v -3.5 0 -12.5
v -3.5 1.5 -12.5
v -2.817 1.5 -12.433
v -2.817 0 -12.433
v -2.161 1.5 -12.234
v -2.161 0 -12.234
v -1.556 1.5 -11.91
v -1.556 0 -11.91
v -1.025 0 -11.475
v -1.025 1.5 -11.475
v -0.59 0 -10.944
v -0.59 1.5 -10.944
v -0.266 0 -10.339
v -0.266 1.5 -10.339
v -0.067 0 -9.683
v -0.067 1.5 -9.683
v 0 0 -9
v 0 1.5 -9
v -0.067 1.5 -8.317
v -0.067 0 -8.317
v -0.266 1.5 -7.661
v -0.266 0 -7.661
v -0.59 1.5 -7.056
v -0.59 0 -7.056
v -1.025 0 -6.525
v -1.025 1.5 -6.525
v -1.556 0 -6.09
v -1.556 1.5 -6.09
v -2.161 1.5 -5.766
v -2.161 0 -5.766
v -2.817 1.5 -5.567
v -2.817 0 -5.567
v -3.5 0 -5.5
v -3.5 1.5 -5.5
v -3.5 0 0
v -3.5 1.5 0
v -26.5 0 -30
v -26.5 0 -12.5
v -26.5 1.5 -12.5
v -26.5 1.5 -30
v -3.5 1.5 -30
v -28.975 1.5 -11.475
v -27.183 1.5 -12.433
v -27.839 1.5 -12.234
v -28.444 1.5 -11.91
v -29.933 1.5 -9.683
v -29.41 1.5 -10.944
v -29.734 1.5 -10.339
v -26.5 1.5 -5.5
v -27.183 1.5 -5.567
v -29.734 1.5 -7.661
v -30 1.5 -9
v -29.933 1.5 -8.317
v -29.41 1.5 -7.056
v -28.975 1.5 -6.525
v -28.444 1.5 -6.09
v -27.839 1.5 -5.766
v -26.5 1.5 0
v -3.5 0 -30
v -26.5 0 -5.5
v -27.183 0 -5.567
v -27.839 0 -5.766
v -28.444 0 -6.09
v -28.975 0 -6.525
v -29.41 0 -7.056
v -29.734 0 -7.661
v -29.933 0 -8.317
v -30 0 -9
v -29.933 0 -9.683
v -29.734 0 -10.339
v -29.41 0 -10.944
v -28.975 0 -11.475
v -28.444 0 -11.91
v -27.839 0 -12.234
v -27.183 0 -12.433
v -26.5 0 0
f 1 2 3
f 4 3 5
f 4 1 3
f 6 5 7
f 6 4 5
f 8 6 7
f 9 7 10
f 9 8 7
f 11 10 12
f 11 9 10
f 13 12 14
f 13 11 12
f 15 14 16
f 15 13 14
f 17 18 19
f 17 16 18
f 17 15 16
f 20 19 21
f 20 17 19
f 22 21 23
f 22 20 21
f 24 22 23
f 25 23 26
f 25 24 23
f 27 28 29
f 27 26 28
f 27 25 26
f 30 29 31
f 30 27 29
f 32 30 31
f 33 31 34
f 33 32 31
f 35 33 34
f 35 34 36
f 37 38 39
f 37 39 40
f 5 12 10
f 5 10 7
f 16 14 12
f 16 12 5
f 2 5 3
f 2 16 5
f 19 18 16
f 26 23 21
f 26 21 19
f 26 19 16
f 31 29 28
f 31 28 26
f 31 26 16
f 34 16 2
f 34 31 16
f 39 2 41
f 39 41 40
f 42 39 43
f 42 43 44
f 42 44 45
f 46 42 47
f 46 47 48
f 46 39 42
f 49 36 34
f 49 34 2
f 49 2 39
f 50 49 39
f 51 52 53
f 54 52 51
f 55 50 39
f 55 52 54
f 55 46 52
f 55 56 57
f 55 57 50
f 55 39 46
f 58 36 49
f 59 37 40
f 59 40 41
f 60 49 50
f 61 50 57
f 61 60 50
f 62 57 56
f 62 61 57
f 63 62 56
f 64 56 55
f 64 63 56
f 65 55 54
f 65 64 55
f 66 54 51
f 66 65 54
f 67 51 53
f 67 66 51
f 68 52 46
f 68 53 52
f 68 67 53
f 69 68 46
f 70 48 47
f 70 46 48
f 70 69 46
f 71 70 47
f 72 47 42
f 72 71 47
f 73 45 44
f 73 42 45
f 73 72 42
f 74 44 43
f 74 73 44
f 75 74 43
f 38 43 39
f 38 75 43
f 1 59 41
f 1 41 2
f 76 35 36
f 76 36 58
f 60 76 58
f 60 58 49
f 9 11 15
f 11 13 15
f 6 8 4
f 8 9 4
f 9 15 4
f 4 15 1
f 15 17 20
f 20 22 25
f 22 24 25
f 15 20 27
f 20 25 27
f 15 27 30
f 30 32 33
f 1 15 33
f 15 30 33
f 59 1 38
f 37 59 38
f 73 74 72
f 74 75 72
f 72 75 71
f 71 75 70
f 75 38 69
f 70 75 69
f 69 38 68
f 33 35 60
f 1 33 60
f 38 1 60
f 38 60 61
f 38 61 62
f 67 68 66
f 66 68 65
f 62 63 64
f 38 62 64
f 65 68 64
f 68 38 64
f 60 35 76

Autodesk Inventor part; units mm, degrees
ref_plane "YZ Plane" through (0, 0, 0) normal (1, 0, 0) x (0, 1, 0)
ref_plane "XZ Plane" through (0, 0, 0) normal (0, 1, 0) x (-1, 0, 0)
ref_plane "XY Plane" through (0, 0, 0) normal (0, 0, 1) x (1, 0, 0)
sketch "スケッチ1" plane through (0, 0, 0) normal (0, 1, 0) x (-1, 0, 0)
  line L0 (0, 0) -> (30, 0)
  line L1 (30, 0) -> (30, -30)
  line L2 (30, -30) -> (0, -30)
  line L3 (0, -30) -> (0, 0)
  circle A0 centre (26.5, -9) radius 3.5
  circle A1 centre (3.5, -9) radius 3.5
  line L4 (26.5, 0) -> (26.5, -30)
  line L5 (3.5, -30) -> (3.5, 0)
  point P0 (26.5, -12.5)
  point P1 (26.5, -5.5)
  point P2 (3.5, -5.5)
  point P3 (3.5, -12.5)
  dimension "d0" = 30
  dimension "d1" = 30
  dimension "d2" = 7
  dimension "d3" = 7
  dimension "d4" = 9
extrude "押し出し1" add sketch "スケッチ1" along normal blind 1.5 contours L0 L4 A0 L2 L5 A1 | A1 L5 | A1 L5 | L4 A0 | A0 L4
properties part number "type_A"
